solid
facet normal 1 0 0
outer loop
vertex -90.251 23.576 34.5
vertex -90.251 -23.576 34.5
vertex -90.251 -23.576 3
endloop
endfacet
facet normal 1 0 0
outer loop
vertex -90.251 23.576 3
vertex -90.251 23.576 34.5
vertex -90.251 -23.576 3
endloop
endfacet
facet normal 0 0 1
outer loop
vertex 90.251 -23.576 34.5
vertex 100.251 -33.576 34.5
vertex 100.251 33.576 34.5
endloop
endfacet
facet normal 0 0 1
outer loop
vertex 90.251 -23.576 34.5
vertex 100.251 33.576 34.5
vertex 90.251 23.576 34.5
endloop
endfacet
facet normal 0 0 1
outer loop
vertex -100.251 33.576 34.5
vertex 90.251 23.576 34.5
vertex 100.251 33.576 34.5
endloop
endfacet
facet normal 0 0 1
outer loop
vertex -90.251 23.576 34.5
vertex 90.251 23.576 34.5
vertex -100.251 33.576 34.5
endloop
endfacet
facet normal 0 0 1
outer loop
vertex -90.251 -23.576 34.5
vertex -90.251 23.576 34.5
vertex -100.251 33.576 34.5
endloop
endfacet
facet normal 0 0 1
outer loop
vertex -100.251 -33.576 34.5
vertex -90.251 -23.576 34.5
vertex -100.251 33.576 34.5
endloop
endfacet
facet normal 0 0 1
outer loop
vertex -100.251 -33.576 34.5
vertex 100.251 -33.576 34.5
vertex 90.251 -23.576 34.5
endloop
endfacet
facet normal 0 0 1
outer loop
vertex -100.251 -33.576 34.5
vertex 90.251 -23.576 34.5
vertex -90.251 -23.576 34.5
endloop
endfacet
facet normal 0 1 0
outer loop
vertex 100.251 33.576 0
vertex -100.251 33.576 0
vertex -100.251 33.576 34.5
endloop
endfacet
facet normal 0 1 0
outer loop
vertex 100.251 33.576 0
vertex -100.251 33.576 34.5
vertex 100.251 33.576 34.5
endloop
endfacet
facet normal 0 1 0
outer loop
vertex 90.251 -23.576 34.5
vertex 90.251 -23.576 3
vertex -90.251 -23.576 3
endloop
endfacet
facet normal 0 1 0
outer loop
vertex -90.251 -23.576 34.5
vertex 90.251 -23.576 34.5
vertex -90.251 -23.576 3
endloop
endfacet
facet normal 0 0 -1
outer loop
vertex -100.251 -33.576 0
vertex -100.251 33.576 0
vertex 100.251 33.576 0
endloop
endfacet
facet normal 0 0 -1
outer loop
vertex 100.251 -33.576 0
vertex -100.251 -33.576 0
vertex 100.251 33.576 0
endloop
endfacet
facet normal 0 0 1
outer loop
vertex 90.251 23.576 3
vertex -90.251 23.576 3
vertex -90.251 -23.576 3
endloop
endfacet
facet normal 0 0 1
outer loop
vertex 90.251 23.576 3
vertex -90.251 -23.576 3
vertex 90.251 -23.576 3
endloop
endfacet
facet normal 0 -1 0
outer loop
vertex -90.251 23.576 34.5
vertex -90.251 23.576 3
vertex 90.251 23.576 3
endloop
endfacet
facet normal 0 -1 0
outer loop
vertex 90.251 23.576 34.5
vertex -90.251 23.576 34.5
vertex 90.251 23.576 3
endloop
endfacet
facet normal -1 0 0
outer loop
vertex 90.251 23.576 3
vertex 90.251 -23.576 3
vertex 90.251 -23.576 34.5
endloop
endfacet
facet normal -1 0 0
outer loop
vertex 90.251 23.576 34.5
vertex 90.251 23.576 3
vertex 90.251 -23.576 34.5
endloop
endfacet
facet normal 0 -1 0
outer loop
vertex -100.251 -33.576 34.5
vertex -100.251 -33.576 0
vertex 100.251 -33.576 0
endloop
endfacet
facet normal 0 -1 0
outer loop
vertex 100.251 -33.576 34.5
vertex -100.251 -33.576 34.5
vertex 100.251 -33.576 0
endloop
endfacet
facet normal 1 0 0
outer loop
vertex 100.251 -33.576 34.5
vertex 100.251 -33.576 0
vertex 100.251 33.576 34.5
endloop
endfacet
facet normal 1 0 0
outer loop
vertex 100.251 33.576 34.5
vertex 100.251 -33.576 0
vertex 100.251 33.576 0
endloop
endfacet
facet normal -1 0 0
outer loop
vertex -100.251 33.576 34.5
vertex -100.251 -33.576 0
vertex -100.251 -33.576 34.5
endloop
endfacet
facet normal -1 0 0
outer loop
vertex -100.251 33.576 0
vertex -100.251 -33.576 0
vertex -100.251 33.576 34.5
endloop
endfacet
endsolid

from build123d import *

# Parameters (mm, degrees)
SKETCH_1_W                 = 200.502
SKETCH_1_H                 = 67.152
EXTRUDE_2_DEPTH            = 34.5
SHELL_3_T                  = -3
SHELL_3_THICKNESS_2_FACE_W = 194.502
SHELL_3_THICKNESS_2_FACE_H = 31.5
SHELL_3_THICKNESS_2_DEPTH  = 7
SHELL_3_THICKNESS_3_FACE_W = 31.5
SHELL_3_THICKNESS_3_FACE_H = 54.152
SHELL_3_THICKNESS_3_DEPTH  = 7
SHELL_3_THICKNESS_4_FACE_W = 31.5
SHELL_3_THICKNESS_4_FACE_H = 54.152
SHELL_3_THICKNESS_4_DEPTH  = 7
SHELL_3_THICKNESS_5_FACE_W = 180.502
SHELL_3_THICKNESS_5_FACE_H = 31.5
SHELL_3_THICKNESS_5_DEPTH  = 7


with BuildPart() as part:
    # 草图1 → 凸台-拉伸2 (new body)
    with BuildSketch(Plane.XY):
        Rectangle(SKETCH_1_W, SKETCH_1_H)
    extrude(amount=EXTRUDE_2_DEPTH)

    # 抽壳3
    shell_3_openings = [part.faces().sort_by_distance(p)[0] for p in [
        (0, 0, 34.5),
    ]]
    offset(amount=SHELL_3_T, openings=shell_3_openings, kind=Kind.INTERSECTION)

    # 抽壳3 thickness 2 face (on inner face of the shell) → 抽壳3 thickness 2 (add)
    with BuildSketch(Plane(origin=(0, 30.576, 18.75), x_dir=(1, 0, 0), z_dir=(0, 1, 0))):
        Rectangle(SHELL_3_THICKNESS_2_FACE_W, SHELL_3_THICKNESS_2_FACE_H)
    extrude(amount=-SHELL_3_THICKNESS_2_DEPTH)

    # 抽壳3 thickness 3 face (on inner face of the shell) → 抽壳3 thickness 3 (add)
    with BuildSketch(Plane(origin=(97.251, -3.5, 18.75), x_dir=(0, 0, 1), z_dir=(1, 0, 0))):
        Rectangle(SHELL_3_THICKNESS_3_FACE_W, SHELL_3_THICKNESS_3_FACE_H)
    extrude(amount=-SHELL_3_THICKNESS_3_DEPTH)

    # 抽壳3 thickness 4 face (on inner face of the shell) → 抽壳3 thickness 4 (add)
    with BuildSketch(Plane(origin=(-97.251, -3.5, 18.75), x_dir=(0, 0, -1), z_dir=(-1, 0, 0))):
        Rectangle(SHELL_3_THICKNESS_4_FACE_W, SHELL_3_THICKNESS_4_FACE_H)
    extrude(amount=-SHELL_3_THICKNESS_4_DEPTH)

    # 抽壳3 thickness 5 face (on inner face of the shell) → 抽壳3 thickness 5 (add)
    with BuildSketch(Plane(origin=(0, -30.576, 18.75), x_dir=(-1, 0, 0), z_dir=(0, -1, 0))):
        Rectangle(SHELL_3_THICKNESS_5_FACE_W, SHELL_3_THICKNESS_5_FACE_H)
    extrude(amount=-SHELL_3_THICKNESS_5_DEPTH)


solid = part.part
